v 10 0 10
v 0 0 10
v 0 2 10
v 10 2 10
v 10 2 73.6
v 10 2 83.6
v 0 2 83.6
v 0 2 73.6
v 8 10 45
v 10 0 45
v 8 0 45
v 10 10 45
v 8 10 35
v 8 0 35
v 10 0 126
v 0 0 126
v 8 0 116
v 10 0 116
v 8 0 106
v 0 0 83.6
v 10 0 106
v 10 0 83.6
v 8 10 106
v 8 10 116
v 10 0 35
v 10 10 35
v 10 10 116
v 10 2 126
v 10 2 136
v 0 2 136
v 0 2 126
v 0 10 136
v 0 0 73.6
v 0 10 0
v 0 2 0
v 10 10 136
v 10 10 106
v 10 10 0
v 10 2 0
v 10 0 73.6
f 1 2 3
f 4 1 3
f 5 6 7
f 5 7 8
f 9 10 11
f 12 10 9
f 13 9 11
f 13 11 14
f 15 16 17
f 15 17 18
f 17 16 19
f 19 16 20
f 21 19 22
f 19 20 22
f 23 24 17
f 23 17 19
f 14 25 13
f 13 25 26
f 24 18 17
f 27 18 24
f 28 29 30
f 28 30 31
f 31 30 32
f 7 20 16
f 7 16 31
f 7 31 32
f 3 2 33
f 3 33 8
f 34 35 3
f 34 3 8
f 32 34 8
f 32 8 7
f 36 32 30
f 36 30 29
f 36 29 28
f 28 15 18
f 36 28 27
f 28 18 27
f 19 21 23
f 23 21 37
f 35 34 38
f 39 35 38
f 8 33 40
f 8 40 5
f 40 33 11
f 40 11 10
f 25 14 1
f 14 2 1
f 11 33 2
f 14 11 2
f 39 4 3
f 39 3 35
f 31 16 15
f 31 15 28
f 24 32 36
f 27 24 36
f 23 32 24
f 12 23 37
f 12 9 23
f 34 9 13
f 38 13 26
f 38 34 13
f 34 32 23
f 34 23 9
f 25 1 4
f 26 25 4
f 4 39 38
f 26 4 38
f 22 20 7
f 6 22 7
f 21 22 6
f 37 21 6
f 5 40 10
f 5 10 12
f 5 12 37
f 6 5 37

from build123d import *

# Parameters (mm, degrees)
ESQUISSE1_W             = 10
ESQUISSE1_H             = 10
BOSS_EXTRU_1_DEPTH      = 136
ESQUISSE2_W             = 10
ESQUISSE2_H             = 2
ENL_V_MAT_EXTRU_1_DEPTH = 137.733317081
ESQUISSE3_W             = 10
ESQUISSE3_H             = 10
ENL_V_MAT_EXTRU_2_DEPTH = 2
ESQUISSE4_W             = 10
ESQUISSE4_H             = 10
ENL_V_MAT_EXTRU_3_DEPTH = 2


with BuildPart() as part:
    # Esquisse1 → Boss.-Extru.1 (new body)
    with BuildSketch(Plane.XY):
        with Locations((5, 5)):
            Rectangle(ESQUISSE1_W, ESQUISSE1_H)
    extrude(amount=BOSS_EXTRU_1_DEPTH)

    # Esquisse2 → Enlèv. mat.-Extru.1 (cut, through all)
    with BuildSketch(Plane(origin=(10, 0, 0), x_dir=(0, 0, -1), z_dir=(1, 0, 0))):
        with Locations((-131, 1)):
            Rectangle(ESQUISSE2_W, ESQUISSE2_H)
        with Locations((-78.6, 1)):
            Rectangle(ESQUISSE2_W, ESQUISSE2_H)
        with Locations((-5, 1)):
            Rectangle(ESQUISSE2_W, ESQUISSE2_H)
    extrude(amount=-ENL_V_MAT_EXTRU_1_DEPTH, mode=Mode.SUBTRACT)

    # Esquisse3 → Enlèv. mat.-Extru.2 (cut)
    with BuildSketch(Plane(origin=(10, 0, 0), x_dir=(0, 0, -1), z_dir=(1, 0, 0))):
        with Locations((-40, 5)):
            Rectangle(ESQUISSE3_W, ESQUISSE3_H)
    extrude(amount=-ENL_V_MAT_EXTRU_2_DEPTH, mode=Mode.SUBTRACT)

    # Esquisse4 → Enlèv. mat.-Extru.3 (cut)
    with BuildSketch(Plane(origin=(10, 0, 0), x_dir=(0, 0, -1), z_dir=(1, 0, 0))):
        with Locations((-111, 5)):
            Rectangle(ESQUISSE4_W, ESQUISSE4_H)
    extrude(amount=-ENL_V_MAT_EXTRU_3_DEPTH, mode=Mode.SUBTRACT)


solid = part.part
